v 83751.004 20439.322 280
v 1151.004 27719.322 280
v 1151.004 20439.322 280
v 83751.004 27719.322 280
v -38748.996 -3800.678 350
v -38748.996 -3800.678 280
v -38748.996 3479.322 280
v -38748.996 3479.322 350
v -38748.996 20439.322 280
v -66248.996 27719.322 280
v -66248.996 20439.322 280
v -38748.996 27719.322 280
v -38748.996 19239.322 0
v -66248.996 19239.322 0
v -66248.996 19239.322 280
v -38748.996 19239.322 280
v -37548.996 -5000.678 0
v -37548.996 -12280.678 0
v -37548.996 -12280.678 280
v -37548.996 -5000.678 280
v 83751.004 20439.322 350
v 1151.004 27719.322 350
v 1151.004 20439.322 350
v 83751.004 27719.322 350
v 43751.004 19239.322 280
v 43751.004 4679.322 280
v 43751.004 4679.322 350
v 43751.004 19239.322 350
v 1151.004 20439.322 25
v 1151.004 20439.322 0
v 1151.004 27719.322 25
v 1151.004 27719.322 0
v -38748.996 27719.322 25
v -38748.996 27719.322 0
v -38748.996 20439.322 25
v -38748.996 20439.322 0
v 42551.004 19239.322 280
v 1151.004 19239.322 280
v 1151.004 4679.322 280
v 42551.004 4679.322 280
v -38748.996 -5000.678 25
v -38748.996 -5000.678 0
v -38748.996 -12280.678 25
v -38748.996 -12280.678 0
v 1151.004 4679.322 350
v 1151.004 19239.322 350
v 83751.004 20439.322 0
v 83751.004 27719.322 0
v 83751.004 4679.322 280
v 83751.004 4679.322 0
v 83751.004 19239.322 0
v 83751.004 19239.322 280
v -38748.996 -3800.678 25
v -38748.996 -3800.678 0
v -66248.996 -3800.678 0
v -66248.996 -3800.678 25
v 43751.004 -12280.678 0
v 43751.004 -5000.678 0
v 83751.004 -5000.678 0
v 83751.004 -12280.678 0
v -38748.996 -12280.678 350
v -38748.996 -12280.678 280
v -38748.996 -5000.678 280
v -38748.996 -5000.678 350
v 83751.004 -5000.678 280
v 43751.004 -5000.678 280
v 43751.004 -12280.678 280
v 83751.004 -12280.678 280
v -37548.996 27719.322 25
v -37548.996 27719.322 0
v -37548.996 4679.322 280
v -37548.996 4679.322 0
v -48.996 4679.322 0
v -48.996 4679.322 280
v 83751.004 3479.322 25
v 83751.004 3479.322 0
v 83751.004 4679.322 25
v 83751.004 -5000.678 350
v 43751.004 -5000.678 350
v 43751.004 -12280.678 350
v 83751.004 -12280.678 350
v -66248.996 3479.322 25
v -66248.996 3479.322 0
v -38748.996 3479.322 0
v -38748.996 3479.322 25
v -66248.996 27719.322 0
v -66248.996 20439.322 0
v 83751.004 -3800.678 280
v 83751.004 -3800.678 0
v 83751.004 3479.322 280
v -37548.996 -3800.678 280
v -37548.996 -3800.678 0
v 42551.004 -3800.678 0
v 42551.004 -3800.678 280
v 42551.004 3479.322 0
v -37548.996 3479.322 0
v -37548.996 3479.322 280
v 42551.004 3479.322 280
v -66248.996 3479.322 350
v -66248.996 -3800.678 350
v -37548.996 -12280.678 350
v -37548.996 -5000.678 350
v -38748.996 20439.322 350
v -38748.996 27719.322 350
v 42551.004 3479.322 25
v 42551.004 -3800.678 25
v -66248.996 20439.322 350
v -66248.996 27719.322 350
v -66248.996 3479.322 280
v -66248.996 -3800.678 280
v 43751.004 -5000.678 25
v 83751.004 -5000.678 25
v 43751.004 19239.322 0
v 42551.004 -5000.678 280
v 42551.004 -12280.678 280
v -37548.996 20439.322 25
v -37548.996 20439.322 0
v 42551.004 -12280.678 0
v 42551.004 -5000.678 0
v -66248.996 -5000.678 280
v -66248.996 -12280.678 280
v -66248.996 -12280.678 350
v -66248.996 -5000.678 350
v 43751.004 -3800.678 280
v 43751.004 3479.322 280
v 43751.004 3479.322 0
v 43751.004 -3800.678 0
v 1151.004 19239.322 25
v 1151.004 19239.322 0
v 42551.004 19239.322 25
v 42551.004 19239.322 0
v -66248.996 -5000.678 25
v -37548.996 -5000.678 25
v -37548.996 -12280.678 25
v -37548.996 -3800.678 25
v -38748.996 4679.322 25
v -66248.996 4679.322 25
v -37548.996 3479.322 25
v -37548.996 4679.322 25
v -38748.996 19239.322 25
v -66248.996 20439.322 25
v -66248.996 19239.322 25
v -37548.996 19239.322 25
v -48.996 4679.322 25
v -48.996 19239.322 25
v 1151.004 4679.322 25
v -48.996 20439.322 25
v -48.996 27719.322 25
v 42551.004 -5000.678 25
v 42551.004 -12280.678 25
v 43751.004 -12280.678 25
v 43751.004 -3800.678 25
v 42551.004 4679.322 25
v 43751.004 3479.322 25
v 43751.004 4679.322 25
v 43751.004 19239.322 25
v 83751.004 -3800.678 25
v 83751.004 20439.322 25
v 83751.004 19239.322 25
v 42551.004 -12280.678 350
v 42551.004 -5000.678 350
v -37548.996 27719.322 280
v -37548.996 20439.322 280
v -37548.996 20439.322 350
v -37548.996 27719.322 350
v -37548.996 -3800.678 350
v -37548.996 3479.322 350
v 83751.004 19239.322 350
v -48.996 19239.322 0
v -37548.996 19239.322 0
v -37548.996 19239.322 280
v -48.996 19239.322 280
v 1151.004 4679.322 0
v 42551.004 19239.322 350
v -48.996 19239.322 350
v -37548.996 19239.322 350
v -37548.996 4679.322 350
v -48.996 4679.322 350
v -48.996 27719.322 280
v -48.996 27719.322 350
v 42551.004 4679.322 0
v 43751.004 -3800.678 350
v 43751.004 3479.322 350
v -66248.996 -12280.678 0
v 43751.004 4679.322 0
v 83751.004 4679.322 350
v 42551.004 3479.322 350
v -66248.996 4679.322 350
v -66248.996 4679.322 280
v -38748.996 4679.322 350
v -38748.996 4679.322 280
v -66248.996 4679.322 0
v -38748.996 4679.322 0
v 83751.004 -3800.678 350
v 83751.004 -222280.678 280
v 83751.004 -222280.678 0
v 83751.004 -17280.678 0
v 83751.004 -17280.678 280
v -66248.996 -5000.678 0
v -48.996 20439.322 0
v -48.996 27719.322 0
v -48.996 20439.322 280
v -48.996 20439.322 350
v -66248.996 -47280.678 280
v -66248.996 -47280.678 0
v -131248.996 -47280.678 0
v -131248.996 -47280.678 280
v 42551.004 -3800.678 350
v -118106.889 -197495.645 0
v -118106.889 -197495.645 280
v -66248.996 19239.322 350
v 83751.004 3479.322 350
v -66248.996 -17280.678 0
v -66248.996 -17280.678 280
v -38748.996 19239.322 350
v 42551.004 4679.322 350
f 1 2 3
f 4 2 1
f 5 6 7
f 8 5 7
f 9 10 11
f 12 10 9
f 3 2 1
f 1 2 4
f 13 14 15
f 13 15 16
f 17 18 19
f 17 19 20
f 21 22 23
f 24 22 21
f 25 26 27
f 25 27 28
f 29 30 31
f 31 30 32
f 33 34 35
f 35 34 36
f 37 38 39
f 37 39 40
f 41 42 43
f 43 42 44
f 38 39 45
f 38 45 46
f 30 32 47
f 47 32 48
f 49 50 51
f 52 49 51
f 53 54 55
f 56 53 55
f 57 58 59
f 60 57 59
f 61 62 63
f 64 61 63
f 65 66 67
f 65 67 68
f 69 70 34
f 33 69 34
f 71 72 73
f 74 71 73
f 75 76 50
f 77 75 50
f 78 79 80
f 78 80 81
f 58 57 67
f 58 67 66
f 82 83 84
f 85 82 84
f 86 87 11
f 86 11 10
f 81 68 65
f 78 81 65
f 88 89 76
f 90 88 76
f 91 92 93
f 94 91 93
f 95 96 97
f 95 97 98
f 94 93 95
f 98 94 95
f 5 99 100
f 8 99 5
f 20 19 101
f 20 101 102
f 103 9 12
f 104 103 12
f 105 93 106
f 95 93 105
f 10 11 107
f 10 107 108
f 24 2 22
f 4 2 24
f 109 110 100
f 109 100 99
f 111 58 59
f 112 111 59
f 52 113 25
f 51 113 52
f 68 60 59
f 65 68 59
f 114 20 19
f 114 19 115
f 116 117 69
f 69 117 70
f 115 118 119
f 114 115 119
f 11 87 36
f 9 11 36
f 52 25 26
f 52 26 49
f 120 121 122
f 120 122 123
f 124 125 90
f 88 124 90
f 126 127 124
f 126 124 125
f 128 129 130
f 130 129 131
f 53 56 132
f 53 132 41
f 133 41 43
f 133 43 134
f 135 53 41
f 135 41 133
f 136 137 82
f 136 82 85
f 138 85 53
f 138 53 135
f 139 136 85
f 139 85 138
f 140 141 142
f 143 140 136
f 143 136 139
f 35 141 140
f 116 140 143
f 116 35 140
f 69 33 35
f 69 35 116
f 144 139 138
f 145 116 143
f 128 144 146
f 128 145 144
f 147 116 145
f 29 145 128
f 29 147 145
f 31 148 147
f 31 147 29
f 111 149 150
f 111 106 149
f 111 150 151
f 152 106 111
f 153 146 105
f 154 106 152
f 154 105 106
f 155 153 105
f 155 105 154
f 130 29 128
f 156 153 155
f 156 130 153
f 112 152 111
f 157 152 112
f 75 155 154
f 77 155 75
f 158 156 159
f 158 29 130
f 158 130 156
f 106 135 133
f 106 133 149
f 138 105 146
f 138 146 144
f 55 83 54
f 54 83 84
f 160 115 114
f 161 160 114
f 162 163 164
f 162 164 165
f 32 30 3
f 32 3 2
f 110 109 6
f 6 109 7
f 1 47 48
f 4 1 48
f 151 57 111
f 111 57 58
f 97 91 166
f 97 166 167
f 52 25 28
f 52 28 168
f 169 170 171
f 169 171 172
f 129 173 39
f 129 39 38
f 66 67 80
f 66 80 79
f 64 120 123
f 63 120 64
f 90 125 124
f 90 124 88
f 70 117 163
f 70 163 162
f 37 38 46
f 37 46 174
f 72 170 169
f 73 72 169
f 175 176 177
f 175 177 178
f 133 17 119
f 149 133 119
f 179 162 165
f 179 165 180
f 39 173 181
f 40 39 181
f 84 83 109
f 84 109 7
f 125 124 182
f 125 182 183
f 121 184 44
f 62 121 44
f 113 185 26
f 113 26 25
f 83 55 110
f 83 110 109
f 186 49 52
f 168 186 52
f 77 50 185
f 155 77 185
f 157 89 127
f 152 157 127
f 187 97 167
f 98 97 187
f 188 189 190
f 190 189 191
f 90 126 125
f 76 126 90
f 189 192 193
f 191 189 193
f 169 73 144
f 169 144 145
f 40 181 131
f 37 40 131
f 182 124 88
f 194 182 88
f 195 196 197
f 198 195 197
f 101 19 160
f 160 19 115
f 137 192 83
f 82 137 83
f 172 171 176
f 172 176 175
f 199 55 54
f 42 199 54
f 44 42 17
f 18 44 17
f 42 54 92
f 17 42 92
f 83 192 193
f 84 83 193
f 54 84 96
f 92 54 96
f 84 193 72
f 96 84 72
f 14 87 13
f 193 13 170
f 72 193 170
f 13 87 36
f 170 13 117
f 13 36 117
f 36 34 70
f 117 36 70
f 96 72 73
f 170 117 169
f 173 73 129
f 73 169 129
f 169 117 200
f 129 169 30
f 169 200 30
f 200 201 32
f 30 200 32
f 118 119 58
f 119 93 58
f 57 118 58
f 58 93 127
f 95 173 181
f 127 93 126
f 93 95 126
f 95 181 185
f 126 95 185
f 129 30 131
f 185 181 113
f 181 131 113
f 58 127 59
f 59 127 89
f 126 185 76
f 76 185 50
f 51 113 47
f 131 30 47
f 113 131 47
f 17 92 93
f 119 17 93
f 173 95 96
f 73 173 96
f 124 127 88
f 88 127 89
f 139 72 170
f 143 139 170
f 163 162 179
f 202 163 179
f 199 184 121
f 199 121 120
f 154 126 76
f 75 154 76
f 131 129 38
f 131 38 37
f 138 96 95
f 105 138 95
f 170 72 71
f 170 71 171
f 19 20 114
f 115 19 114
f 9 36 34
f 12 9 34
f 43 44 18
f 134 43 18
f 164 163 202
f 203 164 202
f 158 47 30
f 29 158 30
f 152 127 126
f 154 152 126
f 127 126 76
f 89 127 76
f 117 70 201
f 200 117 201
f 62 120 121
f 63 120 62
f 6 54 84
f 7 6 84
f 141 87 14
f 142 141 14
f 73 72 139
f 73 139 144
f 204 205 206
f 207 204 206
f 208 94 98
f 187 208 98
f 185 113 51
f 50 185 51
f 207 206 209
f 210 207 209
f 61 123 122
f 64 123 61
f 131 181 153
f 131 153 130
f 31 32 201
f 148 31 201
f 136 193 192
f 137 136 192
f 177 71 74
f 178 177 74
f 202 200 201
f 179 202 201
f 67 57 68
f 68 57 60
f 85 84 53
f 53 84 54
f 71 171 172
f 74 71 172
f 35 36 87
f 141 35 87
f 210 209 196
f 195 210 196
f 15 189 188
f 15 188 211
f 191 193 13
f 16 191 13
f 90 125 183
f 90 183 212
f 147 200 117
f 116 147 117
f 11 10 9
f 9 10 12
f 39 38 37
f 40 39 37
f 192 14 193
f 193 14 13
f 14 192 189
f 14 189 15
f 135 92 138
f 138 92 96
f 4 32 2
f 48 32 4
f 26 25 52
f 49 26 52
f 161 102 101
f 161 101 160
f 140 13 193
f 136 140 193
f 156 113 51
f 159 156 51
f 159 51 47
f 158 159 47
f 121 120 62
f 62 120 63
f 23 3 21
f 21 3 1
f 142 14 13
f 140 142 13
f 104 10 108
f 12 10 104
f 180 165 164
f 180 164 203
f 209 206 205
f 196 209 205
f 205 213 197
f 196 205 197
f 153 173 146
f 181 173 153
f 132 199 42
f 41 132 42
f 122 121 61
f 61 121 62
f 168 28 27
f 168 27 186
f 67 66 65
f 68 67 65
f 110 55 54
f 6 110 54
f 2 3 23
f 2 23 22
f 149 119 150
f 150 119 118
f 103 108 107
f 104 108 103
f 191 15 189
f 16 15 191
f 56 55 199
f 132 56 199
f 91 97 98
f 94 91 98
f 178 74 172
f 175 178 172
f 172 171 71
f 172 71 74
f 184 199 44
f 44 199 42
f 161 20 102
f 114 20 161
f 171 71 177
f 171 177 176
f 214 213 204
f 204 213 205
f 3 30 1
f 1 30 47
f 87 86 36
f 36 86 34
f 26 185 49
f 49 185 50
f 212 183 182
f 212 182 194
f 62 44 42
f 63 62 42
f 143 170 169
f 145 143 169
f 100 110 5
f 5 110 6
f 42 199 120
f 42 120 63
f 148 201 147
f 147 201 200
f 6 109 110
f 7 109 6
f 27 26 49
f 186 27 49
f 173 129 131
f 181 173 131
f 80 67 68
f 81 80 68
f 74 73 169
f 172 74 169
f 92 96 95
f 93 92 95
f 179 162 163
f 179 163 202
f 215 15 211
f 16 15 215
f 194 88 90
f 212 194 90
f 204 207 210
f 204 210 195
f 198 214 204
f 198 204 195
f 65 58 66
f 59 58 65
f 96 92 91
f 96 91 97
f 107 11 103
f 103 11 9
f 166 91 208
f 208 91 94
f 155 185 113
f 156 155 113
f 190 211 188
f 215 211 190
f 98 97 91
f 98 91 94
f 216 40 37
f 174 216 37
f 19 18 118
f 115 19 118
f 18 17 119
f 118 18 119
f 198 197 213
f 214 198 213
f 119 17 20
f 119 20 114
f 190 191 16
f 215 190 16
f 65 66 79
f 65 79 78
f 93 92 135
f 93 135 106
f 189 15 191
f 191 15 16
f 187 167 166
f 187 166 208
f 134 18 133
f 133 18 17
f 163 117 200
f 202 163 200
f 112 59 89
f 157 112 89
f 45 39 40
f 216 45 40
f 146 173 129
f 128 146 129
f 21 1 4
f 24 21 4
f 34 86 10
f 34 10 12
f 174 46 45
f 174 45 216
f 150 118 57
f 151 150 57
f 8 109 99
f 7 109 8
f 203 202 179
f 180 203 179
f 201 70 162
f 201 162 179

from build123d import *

# Parameters (mm, degrees)
F0_W     = 80100
F0_H     = 7280
F0_W_2   = 37500
F0_H_2   = 14560
F0_W_3   = 41400
F3_DEPTH = 25
F4_START = 280
F0_W_4   = 27500
F4_DEPTH = 70
F0_W_5   = 40000
F5_START = 280
F5_DEPTH = 70
F6_START = 280
F6_DEPTH = 70
F0_W_6   = 82600
F7_START = 280
F7_DEPTH = 70
F8_DEPTH = 280
F9_DEPTH = 280


# Not quite as in the source:
# - a feature names something its author has since deleted; it is built from what else it names


with BuildPart() as f3:
    # F0 (on Top) → F3 (new body)
    with BuildSketch(Plane.XY):
        Polygon((1151.0040283203, 20439.3217722573), (1151.0040283203, 27719.3217722572), (-48.9959716797, 27719.3217722572), (-48.9959716797, 20439.3217722573), (-37548.9959716797, 20439.3217722573), (-37548.9959716797, 27719.3217722572), (-38748.9959716797, 27719.3217722572), (-38748.9959716797, 20439.3217722573), (-66248.9959716797, 20439.3217722573), (-66248.9959716797, 19239.3217722572), (-38748.9959716797, 19239.3217722572), (-38748.9959716797, 4679.3217722572), (-66248.9959716797, 4679.3217722572), (-66248.9959716797, 3479.3217722572), (-38748.9959716797, 3479.3217722572), (-38748.9959716797, -3800.6782277428), (-66248.9959716797, -3800.6782277428), (-66248.9959716797, -5000.6782277428), (-38748.9959716797, -5000.6782277428), (-38748.9959716797, -12280.6782277428), (-37548.9959716797, -12280.6782277428), (-37548.9959716797, -5000.6782277428), (42551.0040283203, -5000.6782277428), (42551.0040283203, -12280.6782277428), (43751.0040283203, -12280.6782277428), (43751.0040283203, -5000.6782277428), (83751.0040283203, -5000.6782277428), (83751.0040283203, -3800.6782277427), (43751.0040283203, -3800.6782277427), (43751.0040283203, 3479.3217722572), (83751.0040283203, 3479.3217722572), (83751.0040283203, 4679.3217722573), (43751.0040283203, 4679.3217722573), (43751.0040283203, 19239.3217722572), (83751.0040283203, 19239.3217722573), (83751.0040283203, 20439.3217722573), align=None)
        with Locations((2501.0040283203, -160.6782277428)):
            Rectangle(F0_W, F0_H, mode=Mode.SUBTRACT)
        with Locations((-18798.9959716797, 11959.3217722572)):
            Rectangle(F0_W_2, F0_H_2, mode=Mode.SUBTRACT)
        with Locations((21851.0040283203, 11959.3217722572)):
            Rectangle(F0_W_3, F0_H_2, mode=Mode.SUBTRACT)
    extrude(amount=F3_DEPTH)


with BuildPart() as f4:
    # F0 (on Top) → F4 (new body)
    with BuildSketch(Plane.XY.offset(F4_START)):
        with Locations((-52498.9959716797, -8640.6782277428)):
            Rectangle(F0_W_4, F0_H)
    extrude(amount=F4_DEPTH)


with BuildPart() as f4b:
    # F0 (on Top) → F4, piece 2 (new body)
    with BuildSketch(Plane.XY.offset(F4_START)):
        with Locations((-18798.9959716797, 24079.3217722572)):
            Rectangle(F0_W_2, F0_H)
    extrude(amount=F4_DEPTH)


with BuildPart() as f4c:
    # F0 (on Top) → F4, piece 3 (new body)
    with BuildSketch(Plane.XY.offset(F4_START)):
        with Locations((63751.0040283203, 11959.3217722573)):
            Rectangle(F0_W_5, F0_H_2)
    extrude(amount=F4_DEPTH)


with BuildPart() as f5:
    # F0 (on Top) → F5 (new body)
    with BuildSketch(Plane.XY.offset(F5_START)):
        with Locations((2501.0040283203, -8640.6782277428)):
            Rectangle(F0_W, F0_H)
    extrude(amount=F5_DEPTH)


with BuildPart() as f5b:
    # F0 (on Top) → F5, piece 2 (new body)
    with BuildSketch(Plane.XY.offset(F5_START)):
        with Locations((-52498.9959716797, 24079.3217722572)):
            Rectangle(F0_W_4, F0_H)
    extrude(amount=F5_DEPTH)


with BuildPart() as f6:
    # F0 (on Top) → F6 (new body)
    with BuildSketch(Plane.XY.offset(F6_START)):
        with Locations((2501.0040283203, -160.6782277428)):
            Rectangle(F0_W, F0_H)
    extrude(amount=F6_DEPTH)


with BuildPart() as f6b:
    # F0 (on Top) → F6, piece 2 (new body)
    with BuildSketch(Plane.XY.offset(F6_START)):
        with Locations((42451.0040283203, 24079.3217722573)):
            Rectangle(F0_W_6, F0_H)
    extrude(amount=F6_DEPTH)


with BuildPart() as f7:
    # F0 (on Top) → F7 (new body)
    with BuildSketch(Plane.XY.offset(F7_START)):
        with Locations((63751.0040283203, -8640.6782277428)):
            Rectangle(F0_W_5, F0_H)
    extrude(amount=F7_DEPTH)


with BuildPart() as f7b:
    # F0 (on Top) → F7, piece 2 (new body)
    with BuildSketch(Plane.XY.offset(F7_START)):
        with Locations((63751.0040283203, -160.6782277427)):
            Rectangle(F0_W_5, F0_H)
    extrude(amount=F7_DEPTH)


with BuildPart() as f7c:
    # F0 (on Top) → F7, piece 3 (new body)
    with BuildSketch(Plane.XY.offset(F7_START)):
        with Locations((21851.0040283203, 11959.3217722573)):
            Rectangle(F0_W_3, F0_H_2)
    extrude(amount=F7_DEPTH)


with BuildPart() as f7d:
    # F0 (on Top) → F7, piece 4 (new body)
    with BuildSketch(Plane.XY.offset(F7_START)):
        with Locations((-18798.9959716797, 11959.3217722572)):
            Rectangle(F0_W_2, F0_H_2)
    extrude(amount=F7_DEPTH)


with BuildPart() as f7e:
    # F0 (on Top) → F7, piece 5 (new body)
    with BuildSketch(Plane.XY.offset(F7_START)):
        with Locations((-52498.9959716797, 11959.3217722572)):
            Rectangle(F0_W_4, F0_H_2)
    extrude(amount=F7_DEPTH)


with BuildPart() as f7f:
    # F0 (on Top) → F7, piece 6 (new body)
    with BuildSketch(Plane.XY.offset(F7_START)):
        with Locations((-52498.9959716797, -160.6782277428)):
            Rectangle(F0_W_4, F0_H)
    extrude(amount=F7_DEPTH)


with BuildPart() as f8:
    # F0 (on Top) → F8 (new body)
    with BuildSketch(Plane.XY):
        with Locations((42451.0040283203, 24079.3217722573)):
            Rectangle(F0_W_6, F0_H)
    extrude(amount=F8_DEPTH)


with BuildPart() as f8b:
    # F0 (on Top) → F8, piece 2 (new body)
    with BuildSketch(Plane.XY):
        with Locations((63751.0040283203, 11959.3217722573)):
            Rectangle(F0_W_5, F0_H_2)
    extrude(amount=F8_DEPTH)


with BuildPart() as f8c:
    # F0 (on Top) → F8, piece 3 (new body)
    with BuildSketch(Plane.XY):
        with Locations((21851.0040283203, 11959.3217722573)):
            Rectangle(F0_W_3, F0_H_2)
    extrude(amount=F8_DEPTH)


with BuildPart() as f8d:
    # F0 (on Top) → F8, piece 4 (new body)
    with BuildSketch(Plane.XY):
        with Locations((-18798.9959716797, 24079.3217722572)):
            Rectangle(F0_W_2, F0_H)
    extrude(amount=F8_DEPTH)


with BuildPart() as f8e:
    # F0 (on Top) → F8, piece 5 (new body)
    with BuildSketch(Plane.XY):
        with Locations((-52498.9959716797, 24079.3217722572)):
            Rectangle(F0_W_4, F0_H)
    extrude(amount=F8_DEPTH)


with BuildPart() as f8f:
    # F0 (on Top) → F8, piece 6 (new body)
    with BuildSketch(Plane.XY):
        with Locations((-52498.9959716797, 11959.3217722572)):
            Rectangle(F0_W_4, F0_H_2)
    extrude(amount=F8_DEPTH)


with BuildPart() as f8g:
    # F0 (on Top) → F8, piece 7 (new body)
    with BuildSketch(Plane.XY):
        with Locations((-52498.9959716797, -160.6782277428)):
            Rectangle(F0_W_4, F0_H)
    extrude(amount=F8_DEPTH)


with BuildPart() as f8h:
    # F0 (on Top) → F8, piece 8 (new body)
    with BuildSketch(Plane.XY):
        with Locations((-52498.9959716797, -8640.6782277428)):
            Rectangle(F0_W_4, F0_H)
    extrude(amount=F8_DEPTH)


with BuildPart() as f8i:
    # F0 (on Top) → F8, piece 9 (new body)
    with BuildSketch(Plane.XY):
        with Locations((2501.0040283203, -8640.6782277428)):
            Rectangle(F0_W, F0_H)
    extrude(amount=F8_DEPTH)


with BuildPart() as f8j:
    # F0 (on Top) → F8, piece 10 (new body)
    with BuildSketch(Plane.XY):
        with Locations((2501.0040283203, -160.6782277428)):
            Rectangle(F0_W, F0_H)
    extrude(amount=F8_DEPTH)


with BuildPart() as f8k:
    # F0 (on Top) → F8, piece 11 (new body)
    with BuildSketch(Plane.XY):
        with Locations((63751.0040283203, -160.6782277427)):
            Rectangle(F0_W_5, F0_H)
    extrude(amount=F8_DEPTH)


with BuildPart() as f8l:
    # F0 (on Top) → F8, piece 12 (new body)
    with BuildSketch(Plane.XY):
        with Locations((63751.0040283203, -8640.6782277428)):
            Rectangle(F0_W_5, F0_H)
    extrude(amount=F8_DEPTH)


with BuildPart() as f8m:
    # F0 (on Top) → F8, piece 13 (new body)
    with BuildSketch(Plane.XY):
        with Locations((-18798.9959716797, 11959.3217722572)):
            Rectangle(F0_W_2, F0_H_2)
    extrude(amount=F8_DEPTH)


with BuildPart() as f9:
    # F2 (on Top) → F9 (new body)
    with BuildSketch(Plane.XY):
        Polygon((83751.0040283203, -17280.6782277427), (-66248.9959716797, -17280.6782277428), (-66248.9959716797, -47280.6782277428), (-131248.9959716797, -47280.6782277428), (-118106.8892489593, -197495.6454369067), (83751.0040283203, -222280.6782277427), align=None)
    extrude(amount=F9_DEPTH)


solid = Compound([f3.part, f4.part, f4b.part, f4c.part, f5.part, f5b.part, f6.part, f6b.part, f7.part, f7b.part, f7c.part, f7d.part, f7e.part, f7f.part, f8.part, f8b.part, f8c.part, f8d.part, f8e.part, f8f.part, f8g.part, f8h.part, f8i.part, f8j.part, f8k.part, f8l.part, f8m.part, f9.part])
